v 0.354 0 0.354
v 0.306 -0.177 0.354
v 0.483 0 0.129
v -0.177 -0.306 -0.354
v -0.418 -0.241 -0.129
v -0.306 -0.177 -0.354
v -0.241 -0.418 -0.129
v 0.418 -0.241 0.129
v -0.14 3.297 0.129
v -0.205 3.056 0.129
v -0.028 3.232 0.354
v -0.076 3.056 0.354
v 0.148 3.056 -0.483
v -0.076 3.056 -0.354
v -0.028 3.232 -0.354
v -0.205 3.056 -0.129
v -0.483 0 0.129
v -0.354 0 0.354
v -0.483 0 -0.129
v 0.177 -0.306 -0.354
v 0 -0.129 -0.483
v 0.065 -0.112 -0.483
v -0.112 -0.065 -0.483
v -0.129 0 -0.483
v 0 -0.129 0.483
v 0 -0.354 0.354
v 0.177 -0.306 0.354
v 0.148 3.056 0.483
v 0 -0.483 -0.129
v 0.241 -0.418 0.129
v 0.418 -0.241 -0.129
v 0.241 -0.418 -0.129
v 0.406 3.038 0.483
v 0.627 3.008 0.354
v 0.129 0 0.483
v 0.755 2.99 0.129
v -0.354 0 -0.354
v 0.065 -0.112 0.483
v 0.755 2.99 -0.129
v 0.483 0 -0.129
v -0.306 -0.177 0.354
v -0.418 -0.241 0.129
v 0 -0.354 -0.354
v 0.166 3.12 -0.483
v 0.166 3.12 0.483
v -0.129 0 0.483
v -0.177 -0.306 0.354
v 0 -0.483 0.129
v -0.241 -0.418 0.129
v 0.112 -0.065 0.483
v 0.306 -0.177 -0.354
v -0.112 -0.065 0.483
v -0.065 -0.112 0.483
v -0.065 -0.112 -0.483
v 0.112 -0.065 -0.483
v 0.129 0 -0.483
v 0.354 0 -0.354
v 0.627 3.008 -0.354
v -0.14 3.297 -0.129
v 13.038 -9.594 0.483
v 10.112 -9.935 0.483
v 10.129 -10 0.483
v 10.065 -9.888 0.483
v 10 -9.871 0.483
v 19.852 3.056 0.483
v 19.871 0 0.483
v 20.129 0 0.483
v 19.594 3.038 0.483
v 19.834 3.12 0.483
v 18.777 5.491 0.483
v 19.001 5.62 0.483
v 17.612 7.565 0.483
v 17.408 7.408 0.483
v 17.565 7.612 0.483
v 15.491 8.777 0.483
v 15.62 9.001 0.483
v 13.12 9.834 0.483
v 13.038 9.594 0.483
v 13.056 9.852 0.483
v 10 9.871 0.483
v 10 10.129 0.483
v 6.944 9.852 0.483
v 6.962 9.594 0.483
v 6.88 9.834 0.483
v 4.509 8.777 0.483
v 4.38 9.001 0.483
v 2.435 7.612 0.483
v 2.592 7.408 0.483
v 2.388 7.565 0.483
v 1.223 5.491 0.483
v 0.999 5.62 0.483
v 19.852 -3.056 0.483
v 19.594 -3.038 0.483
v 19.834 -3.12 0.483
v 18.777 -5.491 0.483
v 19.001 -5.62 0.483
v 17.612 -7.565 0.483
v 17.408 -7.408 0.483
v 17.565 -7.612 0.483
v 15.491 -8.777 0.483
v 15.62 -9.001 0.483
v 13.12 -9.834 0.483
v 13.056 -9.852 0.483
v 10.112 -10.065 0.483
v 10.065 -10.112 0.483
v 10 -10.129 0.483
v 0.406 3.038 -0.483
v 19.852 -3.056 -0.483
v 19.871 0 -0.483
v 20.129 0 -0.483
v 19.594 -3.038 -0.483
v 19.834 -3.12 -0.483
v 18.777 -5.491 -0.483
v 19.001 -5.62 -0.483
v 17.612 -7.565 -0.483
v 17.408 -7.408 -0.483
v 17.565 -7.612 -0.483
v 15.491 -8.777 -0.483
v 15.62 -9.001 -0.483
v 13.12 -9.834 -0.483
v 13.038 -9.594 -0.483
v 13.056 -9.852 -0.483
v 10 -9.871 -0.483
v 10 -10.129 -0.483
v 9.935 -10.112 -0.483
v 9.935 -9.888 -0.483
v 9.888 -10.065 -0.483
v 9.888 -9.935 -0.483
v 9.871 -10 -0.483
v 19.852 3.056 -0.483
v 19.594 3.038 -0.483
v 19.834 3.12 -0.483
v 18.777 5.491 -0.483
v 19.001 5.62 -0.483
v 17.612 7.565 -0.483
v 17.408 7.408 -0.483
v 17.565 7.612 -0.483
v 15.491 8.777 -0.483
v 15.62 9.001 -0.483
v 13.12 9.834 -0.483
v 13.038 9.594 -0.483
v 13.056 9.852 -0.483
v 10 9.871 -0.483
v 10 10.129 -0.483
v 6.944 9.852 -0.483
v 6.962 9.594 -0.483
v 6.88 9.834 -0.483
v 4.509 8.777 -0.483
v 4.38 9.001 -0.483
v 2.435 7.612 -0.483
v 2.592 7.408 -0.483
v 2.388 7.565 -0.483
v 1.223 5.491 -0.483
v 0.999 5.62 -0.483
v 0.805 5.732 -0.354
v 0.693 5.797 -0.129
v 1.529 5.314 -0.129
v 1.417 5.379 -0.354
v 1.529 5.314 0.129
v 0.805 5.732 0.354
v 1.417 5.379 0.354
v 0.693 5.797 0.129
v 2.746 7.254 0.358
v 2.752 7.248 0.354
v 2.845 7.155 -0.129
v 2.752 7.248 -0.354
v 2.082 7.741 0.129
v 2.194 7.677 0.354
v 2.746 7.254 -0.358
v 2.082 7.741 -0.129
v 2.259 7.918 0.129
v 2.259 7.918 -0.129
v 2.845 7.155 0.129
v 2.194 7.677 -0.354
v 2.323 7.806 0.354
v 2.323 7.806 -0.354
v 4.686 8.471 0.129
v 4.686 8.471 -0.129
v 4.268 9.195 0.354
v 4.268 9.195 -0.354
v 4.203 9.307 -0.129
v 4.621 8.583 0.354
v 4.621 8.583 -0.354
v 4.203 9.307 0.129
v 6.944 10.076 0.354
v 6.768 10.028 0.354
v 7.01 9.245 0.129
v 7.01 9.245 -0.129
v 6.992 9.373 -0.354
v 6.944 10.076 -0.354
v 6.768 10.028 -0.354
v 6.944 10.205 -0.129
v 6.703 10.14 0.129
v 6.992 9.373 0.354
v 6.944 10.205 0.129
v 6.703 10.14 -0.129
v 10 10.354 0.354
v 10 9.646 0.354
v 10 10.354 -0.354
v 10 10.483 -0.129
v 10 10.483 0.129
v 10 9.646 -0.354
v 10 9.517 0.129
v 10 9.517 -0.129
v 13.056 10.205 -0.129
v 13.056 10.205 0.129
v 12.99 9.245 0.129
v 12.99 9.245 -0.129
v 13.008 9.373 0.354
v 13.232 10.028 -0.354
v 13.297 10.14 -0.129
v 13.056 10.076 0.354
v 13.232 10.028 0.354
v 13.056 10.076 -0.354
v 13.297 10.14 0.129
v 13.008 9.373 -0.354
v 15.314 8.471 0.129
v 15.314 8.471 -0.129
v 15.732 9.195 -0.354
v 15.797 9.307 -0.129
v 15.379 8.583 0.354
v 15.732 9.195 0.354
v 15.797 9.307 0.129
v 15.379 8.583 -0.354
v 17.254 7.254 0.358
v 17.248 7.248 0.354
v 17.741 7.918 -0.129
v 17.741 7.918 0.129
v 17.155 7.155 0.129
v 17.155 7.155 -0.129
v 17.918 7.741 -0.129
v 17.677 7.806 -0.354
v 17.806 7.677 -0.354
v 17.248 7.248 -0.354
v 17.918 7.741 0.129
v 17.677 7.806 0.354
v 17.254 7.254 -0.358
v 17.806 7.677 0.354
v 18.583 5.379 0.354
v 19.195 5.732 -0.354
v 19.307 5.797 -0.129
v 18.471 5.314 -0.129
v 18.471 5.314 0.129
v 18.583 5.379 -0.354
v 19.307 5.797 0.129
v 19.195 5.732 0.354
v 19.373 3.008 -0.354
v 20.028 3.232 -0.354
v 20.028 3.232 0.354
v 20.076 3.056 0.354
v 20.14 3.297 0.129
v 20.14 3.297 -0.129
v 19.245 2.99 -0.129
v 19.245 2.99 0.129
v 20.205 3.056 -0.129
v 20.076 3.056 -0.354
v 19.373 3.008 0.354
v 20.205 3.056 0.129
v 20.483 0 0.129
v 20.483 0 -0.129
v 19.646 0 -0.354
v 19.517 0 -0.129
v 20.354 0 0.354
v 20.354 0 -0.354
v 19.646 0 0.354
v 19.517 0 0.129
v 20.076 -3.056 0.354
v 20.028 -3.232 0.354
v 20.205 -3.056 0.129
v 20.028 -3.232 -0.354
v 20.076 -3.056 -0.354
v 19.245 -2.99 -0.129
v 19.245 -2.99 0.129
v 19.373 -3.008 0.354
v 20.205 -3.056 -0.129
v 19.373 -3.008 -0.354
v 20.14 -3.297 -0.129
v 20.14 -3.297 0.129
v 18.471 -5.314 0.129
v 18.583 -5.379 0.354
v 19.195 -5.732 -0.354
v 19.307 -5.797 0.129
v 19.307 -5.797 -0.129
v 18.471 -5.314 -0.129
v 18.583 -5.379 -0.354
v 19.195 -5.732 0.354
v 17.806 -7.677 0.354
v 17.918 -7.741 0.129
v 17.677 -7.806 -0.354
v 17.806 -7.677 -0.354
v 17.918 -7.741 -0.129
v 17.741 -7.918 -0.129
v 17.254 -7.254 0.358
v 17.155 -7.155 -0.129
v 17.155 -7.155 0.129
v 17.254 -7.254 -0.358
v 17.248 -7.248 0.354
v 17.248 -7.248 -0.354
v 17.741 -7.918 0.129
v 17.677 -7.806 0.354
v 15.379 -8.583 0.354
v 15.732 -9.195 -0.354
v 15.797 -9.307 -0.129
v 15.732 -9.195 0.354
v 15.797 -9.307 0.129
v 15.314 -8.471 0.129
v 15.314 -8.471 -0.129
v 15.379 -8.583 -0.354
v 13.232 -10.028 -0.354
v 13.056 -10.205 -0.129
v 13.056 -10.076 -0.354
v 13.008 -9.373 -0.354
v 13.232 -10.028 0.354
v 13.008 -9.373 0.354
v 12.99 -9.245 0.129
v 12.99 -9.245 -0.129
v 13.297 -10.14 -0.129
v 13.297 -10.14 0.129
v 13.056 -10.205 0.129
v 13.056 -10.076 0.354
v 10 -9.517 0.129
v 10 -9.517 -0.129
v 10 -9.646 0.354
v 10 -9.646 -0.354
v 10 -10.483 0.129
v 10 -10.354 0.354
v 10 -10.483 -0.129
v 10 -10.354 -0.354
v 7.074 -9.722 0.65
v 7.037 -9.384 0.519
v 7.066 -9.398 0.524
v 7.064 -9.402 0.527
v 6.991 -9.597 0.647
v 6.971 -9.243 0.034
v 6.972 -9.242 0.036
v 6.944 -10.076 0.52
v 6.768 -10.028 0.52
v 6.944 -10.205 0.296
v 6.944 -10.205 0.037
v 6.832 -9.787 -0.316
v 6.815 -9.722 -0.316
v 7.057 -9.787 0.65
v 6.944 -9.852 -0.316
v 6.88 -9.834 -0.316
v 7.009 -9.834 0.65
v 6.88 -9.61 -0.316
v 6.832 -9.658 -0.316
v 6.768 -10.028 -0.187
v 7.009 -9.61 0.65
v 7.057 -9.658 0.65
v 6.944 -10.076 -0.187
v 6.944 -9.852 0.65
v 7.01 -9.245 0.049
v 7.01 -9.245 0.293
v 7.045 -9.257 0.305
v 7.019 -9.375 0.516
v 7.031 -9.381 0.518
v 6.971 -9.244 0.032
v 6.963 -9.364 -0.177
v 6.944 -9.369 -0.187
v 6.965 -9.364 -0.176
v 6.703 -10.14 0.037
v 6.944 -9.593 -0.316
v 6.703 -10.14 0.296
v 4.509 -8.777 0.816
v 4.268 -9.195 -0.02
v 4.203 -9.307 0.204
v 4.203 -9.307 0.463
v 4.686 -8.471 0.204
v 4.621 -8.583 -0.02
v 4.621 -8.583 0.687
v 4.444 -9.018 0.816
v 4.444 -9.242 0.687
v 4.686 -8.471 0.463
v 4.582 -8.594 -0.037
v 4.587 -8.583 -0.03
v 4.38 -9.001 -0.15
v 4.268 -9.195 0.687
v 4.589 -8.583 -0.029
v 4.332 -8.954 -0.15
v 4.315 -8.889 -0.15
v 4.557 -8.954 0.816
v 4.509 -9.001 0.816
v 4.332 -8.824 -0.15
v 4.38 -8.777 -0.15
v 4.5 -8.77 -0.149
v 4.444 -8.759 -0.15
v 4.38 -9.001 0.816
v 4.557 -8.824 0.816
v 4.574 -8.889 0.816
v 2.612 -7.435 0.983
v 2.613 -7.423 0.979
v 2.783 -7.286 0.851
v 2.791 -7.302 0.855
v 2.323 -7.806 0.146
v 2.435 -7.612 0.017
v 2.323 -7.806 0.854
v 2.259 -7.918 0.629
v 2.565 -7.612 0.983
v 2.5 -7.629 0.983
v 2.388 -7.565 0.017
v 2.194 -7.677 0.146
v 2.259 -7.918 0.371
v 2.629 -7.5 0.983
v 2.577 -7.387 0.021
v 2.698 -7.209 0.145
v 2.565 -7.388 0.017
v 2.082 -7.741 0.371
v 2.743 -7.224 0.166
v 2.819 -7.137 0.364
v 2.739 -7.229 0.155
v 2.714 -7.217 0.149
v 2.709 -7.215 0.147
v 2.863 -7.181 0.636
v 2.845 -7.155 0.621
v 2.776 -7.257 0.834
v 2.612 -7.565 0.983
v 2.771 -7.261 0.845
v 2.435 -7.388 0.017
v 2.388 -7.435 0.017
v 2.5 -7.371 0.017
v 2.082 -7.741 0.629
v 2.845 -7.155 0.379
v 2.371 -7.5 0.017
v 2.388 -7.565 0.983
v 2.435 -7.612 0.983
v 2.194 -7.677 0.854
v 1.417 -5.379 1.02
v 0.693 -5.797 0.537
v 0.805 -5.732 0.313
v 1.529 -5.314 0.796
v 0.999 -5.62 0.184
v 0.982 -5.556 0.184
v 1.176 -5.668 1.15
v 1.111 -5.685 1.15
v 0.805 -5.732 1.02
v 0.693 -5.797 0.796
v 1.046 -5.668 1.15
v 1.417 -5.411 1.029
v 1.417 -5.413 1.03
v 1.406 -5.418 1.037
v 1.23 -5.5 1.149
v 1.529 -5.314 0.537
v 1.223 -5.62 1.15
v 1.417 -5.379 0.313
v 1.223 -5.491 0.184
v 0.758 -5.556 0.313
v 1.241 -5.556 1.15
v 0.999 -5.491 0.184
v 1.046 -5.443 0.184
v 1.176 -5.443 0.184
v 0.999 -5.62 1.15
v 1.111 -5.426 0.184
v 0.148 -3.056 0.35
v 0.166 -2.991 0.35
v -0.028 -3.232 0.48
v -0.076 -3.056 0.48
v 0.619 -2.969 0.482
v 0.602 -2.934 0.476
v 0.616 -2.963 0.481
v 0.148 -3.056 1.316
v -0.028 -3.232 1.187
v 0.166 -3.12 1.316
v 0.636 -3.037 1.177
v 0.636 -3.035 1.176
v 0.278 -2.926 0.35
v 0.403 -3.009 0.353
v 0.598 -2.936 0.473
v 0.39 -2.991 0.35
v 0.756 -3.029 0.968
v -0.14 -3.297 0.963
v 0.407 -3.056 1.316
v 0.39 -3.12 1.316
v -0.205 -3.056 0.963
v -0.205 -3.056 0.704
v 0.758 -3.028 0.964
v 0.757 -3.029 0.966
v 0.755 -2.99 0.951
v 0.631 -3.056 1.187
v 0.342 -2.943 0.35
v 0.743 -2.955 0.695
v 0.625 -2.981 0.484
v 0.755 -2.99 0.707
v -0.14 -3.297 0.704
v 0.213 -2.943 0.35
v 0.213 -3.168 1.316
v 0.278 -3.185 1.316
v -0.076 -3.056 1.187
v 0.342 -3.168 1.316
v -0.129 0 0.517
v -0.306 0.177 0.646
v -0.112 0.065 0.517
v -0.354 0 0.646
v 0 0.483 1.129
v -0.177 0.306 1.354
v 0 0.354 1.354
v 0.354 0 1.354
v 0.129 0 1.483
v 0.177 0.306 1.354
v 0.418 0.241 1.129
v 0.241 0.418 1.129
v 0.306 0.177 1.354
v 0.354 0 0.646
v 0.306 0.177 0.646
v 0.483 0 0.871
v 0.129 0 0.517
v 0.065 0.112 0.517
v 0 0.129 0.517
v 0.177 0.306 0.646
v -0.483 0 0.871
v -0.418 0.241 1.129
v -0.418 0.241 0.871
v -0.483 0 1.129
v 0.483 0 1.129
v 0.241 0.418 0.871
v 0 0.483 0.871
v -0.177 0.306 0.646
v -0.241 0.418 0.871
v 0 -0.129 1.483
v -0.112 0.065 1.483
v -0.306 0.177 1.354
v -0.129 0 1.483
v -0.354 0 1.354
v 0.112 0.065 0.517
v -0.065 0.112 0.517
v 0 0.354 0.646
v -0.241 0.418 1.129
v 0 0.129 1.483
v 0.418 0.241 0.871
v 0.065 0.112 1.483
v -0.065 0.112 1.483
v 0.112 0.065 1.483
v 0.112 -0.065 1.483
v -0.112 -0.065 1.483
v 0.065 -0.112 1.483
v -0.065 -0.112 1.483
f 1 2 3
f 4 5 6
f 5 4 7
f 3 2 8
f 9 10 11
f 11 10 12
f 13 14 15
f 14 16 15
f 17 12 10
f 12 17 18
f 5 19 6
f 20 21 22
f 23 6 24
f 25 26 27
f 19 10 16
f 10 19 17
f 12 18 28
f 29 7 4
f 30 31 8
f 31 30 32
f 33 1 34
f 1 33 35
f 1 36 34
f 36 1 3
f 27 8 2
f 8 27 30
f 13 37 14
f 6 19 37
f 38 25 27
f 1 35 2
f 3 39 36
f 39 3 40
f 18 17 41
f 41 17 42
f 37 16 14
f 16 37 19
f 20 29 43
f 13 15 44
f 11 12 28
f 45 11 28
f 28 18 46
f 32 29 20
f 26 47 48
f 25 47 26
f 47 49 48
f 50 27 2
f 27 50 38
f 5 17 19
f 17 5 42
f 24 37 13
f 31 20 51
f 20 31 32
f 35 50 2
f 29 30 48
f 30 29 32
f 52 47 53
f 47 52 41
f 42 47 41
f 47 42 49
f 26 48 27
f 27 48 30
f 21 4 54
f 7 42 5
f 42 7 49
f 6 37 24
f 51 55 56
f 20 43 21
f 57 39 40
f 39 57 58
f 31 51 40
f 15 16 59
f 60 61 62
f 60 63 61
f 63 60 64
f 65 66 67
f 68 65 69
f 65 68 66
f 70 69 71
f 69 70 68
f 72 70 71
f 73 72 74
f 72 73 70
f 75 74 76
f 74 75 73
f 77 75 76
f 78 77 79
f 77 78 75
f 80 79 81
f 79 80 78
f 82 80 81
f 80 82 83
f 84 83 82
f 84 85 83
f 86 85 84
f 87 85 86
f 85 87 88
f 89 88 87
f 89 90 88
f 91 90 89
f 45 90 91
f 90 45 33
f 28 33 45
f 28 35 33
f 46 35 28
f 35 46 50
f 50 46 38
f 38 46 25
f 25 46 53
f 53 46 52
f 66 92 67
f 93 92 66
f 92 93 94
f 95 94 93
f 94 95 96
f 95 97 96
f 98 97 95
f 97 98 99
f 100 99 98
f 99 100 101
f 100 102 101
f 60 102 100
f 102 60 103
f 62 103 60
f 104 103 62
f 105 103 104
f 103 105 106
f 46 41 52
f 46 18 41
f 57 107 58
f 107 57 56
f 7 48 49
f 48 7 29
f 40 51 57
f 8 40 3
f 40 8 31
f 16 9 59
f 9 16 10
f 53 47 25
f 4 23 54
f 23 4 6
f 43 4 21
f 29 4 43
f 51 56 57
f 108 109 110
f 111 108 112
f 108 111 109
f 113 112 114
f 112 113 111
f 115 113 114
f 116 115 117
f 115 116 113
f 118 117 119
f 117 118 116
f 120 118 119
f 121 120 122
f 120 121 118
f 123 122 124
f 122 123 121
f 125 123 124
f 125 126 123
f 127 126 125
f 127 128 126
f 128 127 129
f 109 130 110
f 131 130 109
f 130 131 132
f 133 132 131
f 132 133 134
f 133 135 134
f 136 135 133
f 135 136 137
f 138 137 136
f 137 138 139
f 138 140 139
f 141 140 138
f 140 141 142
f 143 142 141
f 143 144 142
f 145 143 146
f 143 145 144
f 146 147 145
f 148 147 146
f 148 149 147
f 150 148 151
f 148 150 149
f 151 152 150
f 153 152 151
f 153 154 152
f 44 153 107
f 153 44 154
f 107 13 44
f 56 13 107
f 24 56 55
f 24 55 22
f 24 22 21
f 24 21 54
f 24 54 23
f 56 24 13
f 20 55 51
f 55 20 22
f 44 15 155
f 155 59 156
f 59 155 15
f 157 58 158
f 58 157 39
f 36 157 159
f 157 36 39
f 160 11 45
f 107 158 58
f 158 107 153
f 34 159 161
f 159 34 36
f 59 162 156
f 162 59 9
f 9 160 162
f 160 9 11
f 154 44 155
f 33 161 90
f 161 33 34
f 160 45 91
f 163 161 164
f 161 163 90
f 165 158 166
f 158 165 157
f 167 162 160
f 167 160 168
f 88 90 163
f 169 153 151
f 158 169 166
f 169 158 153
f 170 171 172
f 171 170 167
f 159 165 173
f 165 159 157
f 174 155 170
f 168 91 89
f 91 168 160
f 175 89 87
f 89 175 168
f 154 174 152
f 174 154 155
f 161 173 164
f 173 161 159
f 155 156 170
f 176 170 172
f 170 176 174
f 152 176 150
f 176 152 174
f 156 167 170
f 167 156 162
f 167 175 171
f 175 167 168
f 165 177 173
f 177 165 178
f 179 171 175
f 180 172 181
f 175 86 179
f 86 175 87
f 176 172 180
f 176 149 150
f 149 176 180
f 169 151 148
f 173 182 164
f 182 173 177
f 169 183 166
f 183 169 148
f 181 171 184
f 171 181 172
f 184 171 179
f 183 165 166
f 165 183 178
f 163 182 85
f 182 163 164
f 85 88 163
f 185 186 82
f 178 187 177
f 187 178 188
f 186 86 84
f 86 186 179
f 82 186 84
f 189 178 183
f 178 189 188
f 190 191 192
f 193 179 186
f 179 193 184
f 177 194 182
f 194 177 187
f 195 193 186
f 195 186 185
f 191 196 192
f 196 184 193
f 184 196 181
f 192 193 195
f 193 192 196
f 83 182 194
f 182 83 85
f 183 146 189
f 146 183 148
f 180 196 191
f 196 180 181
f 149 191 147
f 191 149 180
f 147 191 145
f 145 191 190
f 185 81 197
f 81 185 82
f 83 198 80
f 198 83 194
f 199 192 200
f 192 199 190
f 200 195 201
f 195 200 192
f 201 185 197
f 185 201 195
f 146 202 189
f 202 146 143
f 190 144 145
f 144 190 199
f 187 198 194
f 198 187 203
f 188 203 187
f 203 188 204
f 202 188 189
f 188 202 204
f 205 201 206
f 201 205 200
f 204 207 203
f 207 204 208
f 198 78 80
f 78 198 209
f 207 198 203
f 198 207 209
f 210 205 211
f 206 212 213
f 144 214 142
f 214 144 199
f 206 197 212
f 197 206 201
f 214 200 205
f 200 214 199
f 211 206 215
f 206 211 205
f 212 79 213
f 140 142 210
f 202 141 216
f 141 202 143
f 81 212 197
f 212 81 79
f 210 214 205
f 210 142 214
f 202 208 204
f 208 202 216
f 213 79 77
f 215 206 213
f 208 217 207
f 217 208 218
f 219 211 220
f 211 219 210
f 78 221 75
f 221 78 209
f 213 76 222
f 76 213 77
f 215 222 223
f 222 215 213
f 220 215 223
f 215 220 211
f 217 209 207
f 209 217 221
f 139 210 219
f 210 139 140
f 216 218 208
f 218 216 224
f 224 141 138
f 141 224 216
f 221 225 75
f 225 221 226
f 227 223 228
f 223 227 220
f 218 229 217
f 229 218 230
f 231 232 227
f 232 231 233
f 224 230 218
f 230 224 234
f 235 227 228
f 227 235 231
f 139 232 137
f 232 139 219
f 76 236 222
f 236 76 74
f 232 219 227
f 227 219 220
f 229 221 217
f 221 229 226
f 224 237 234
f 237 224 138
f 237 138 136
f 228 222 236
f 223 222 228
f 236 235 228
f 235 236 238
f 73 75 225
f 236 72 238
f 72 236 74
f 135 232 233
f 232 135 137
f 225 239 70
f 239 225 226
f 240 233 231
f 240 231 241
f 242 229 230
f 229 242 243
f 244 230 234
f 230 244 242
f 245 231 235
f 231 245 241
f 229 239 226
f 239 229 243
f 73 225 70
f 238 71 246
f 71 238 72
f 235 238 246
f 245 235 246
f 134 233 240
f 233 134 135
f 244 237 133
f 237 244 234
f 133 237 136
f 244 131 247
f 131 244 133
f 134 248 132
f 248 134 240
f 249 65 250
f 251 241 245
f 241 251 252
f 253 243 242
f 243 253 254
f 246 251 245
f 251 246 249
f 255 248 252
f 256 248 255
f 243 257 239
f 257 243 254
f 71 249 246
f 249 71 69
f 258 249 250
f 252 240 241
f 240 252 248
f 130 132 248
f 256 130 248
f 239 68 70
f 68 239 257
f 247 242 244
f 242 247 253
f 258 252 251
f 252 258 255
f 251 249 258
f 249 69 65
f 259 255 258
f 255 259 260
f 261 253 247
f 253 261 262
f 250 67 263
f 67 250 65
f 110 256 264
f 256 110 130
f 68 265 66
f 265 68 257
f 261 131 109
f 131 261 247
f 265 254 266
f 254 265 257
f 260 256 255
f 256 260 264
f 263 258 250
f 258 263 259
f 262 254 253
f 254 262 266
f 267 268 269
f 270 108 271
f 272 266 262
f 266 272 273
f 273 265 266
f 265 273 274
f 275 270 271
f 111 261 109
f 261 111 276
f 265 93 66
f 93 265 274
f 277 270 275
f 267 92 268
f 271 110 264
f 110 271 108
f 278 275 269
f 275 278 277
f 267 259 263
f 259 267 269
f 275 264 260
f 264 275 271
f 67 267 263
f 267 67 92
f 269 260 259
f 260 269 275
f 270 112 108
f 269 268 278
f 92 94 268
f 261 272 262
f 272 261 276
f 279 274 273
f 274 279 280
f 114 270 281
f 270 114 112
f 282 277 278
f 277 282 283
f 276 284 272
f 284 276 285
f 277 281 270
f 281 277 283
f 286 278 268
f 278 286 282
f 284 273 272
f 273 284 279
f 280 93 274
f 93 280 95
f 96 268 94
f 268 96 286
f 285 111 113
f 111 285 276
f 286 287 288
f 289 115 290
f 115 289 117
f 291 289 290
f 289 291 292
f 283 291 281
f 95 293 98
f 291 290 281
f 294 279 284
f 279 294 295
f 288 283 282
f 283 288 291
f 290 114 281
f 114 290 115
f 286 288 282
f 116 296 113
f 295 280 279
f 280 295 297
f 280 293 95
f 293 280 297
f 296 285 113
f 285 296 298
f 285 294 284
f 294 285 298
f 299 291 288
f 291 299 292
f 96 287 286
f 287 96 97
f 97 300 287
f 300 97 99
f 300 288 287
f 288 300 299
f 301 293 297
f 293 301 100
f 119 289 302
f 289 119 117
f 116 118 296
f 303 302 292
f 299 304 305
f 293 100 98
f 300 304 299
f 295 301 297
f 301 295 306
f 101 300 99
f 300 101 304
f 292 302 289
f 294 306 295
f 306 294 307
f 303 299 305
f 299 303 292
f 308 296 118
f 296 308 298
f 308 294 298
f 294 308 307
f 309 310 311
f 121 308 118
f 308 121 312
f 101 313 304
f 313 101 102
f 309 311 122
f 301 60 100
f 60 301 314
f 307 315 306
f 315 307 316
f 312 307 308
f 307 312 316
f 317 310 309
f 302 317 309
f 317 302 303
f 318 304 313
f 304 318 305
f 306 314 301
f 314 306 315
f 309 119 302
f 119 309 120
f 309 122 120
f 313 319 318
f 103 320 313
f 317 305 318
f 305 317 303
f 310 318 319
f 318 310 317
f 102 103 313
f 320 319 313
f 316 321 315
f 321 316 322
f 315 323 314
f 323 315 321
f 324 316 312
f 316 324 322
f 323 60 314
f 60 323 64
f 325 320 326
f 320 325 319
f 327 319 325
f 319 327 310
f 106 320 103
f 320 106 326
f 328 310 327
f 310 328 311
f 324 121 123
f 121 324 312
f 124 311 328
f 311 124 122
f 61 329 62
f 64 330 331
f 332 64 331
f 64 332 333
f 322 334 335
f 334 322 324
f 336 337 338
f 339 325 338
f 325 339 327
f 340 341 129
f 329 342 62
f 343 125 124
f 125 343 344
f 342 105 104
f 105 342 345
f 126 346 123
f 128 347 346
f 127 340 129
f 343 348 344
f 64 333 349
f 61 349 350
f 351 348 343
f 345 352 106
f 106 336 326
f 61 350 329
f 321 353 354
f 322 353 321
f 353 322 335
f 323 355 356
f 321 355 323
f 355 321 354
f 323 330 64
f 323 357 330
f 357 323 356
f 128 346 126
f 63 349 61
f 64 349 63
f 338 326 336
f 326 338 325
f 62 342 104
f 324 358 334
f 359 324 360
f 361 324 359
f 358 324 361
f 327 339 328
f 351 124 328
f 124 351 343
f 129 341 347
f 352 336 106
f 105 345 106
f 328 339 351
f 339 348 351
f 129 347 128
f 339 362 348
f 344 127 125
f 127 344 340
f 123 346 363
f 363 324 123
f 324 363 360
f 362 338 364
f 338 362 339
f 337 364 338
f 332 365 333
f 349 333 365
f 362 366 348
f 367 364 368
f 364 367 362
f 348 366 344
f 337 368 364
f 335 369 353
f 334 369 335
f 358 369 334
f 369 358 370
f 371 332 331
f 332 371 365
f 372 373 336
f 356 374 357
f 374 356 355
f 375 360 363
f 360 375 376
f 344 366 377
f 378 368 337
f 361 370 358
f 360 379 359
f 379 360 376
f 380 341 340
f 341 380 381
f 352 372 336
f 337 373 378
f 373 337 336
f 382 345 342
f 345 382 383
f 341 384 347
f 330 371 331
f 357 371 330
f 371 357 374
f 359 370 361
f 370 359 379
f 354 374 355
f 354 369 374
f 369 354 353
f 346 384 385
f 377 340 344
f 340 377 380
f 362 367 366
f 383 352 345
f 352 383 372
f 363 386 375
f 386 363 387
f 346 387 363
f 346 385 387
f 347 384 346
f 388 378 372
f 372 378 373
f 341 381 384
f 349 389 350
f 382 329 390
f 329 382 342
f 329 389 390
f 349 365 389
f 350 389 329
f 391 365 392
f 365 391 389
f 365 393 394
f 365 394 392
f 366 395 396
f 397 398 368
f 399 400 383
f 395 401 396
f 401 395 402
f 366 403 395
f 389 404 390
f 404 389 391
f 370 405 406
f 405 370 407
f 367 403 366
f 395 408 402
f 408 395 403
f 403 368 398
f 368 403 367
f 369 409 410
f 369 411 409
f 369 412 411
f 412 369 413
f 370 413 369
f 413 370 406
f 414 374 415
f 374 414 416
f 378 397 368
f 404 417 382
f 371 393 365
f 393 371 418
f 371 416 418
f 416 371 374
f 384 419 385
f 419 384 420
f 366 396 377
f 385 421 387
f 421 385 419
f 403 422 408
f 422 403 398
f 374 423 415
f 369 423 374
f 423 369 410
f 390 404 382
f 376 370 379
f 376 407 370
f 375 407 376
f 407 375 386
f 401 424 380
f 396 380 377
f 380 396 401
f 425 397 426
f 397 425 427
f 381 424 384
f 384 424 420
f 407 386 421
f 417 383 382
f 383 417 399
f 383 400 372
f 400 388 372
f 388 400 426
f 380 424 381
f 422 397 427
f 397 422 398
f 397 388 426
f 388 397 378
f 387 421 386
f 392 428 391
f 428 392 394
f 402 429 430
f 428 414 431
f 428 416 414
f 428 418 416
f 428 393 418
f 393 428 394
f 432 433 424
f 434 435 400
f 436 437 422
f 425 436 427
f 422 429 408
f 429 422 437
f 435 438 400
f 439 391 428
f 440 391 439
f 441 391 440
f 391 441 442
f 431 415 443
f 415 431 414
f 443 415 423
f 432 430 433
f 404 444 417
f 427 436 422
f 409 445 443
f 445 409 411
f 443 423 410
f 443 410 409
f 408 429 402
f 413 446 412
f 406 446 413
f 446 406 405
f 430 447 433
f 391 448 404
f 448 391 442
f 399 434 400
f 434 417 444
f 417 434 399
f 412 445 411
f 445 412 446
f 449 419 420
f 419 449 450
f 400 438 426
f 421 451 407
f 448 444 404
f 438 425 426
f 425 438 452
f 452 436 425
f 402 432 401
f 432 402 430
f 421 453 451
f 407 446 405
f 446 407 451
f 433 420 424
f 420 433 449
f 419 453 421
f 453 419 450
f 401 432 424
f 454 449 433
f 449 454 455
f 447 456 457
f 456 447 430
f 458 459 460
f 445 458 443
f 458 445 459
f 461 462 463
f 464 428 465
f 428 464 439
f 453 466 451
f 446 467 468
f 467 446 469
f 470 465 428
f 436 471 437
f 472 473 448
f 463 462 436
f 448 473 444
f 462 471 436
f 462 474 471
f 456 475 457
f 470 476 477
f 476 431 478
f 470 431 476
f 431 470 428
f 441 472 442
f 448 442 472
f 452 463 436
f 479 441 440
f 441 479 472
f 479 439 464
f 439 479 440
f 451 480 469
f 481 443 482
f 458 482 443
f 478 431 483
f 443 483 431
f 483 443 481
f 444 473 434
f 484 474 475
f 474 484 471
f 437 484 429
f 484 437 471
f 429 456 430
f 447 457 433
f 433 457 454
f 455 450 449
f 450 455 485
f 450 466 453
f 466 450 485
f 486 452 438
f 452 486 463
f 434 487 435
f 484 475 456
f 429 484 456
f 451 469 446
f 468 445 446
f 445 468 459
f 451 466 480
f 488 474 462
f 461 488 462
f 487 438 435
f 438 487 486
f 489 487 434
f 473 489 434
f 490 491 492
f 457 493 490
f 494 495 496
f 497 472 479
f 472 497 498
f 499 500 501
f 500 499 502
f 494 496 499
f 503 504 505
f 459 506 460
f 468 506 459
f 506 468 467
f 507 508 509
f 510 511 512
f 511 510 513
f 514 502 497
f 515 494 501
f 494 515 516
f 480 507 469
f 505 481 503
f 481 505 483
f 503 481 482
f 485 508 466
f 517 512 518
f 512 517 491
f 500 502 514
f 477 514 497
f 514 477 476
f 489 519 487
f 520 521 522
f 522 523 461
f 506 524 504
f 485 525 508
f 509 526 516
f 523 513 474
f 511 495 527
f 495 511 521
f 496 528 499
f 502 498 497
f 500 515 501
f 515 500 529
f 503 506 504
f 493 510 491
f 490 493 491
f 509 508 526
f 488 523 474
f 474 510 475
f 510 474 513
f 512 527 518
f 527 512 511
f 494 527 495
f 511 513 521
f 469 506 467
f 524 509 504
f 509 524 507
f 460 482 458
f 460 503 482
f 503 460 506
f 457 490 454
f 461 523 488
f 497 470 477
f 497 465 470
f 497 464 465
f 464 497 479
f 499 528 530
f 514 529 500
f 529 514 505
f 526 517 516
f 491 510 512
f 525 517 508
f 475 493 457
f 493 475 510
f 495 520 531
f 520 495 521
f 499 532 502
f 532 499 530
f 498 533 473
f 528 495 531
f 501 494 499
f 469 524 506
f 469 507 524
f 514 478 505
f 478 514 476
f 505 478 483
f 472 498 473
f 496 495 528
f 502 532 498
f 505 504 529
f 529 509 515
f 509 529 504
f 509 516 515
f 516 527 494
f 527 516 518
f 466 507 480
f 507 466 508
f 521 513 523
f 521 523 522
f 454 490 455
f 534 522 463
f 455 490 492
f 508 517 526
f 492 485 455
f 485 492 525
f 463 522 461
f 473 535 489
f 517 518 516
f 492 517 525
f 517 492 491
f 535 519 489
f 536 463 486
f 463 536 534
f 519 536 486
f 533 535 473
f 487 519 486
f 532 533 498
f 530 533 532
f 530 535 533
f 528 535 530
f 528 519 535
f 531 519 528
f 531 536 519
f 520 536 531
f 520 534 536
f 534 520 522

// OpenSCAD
// file: ../src/cadence.scad
// as of 2019.05, OpenSCAD understands
// is_num, is_list, is_string, and, is_bool
//
// is_function is coming, but looks tricky



function _normalize_angle(a) =
  ((a >= 0 && a <= 360) ? a : _normalize_angle(a + (a < 0 ? 360 : -360)));


//
// dictionary functions

function _aaget(dict, key, default, off) =
  let (kv = dict[off])
    kv == undef ? default :
    kv[0] == key ? kv[1] :
      _aaget(dict, key, default, off + 1);

function _asget(dict, key, default, off) =
  dict[off] == undef ? default :
  dict[off] == key ? dict[off + 1] :
    _asget(dict, key, default, off + 2);

function _get(dict, key, default=undef) =
  is_string(dict[0]) ?
    _asget(dict, key, default, 0) :
    _aaget(dict, key, default, 0);

function _del(dict, key) =
  [ for (kv = dict) if (kv[0] != key) kv ];

function _put(dict, key, value) =
  concat(_del(dict, key), [ [ key, value ] ]);


//
// list functions

function _idx(list, index, default=undef) =
  let (
    i = index < 0 ? len(list) + index : index,
    r = list[i]
  )
    r == undef ? default : r;

  // sublist
  //
function _slist(list, from=0, to) =
  let(
    li = len(list) - 1,
    end = (to == undef ? li : to),
    a0 = from < 0 ? li + 1 + from : from,
    a = a0 < 0 ? 0 : a0,
    z = end < 0 ? li + 1 + end : end
  )
    a > li ? [] :
    z < a ? [] :
      [ for (i = [a:z]) list[i] ];

function _reverse(list) =
  [ for (i = [ len(list) - 1 : -1 : 0 ]) list[i] ];

//
// point functions

  // Accept a single angle instead of [ angle0, angle1 ]
  // 'sp' is the start point
  //
function _to_point(length, angles, sp=[ 0, 0, 0 ]) =
  let(
    as = is_num(angles) ? [ angles, 0 ] : angles,
    inclination = as[0],
    azimuth = as[1] + 90
  )
    sp + [
      length * cos(inclination) * cos(azimuth),
      length * cos(inclination) * sin(azimuth),
      length * sin(inclination) ];

function _to_spherical(point) =
  let(
    l = norm(point),
    ele = asin(point.z / l),
    dir = atan2(point.y, point.x)
  )
    [ l, [ ele, dir - 90 ] ];


function _midpoint(p0, p1, ratio=0.5) =
  let(
    s = _to_spherical(p1 - p0)
  )
    _to_point(ratio * s[0], s[1], p0);

//function _vlen(vector) =
//  sqrt(pow(vector.x, 2) + pow(vector.y, 2) + pow(vector.z, 2));
  //
  // no, use norm(vector)


// inspiration:
// https://climberg.de/post/openscad_bezier_curves_of_any_degrees

function _bezier_choose(n, k) =
  k == 0 ?  1 : (n * _bezier_choose(n - 1, k - 1)) / k;

function _bezier_point(points, t, i, c) =
  len(points) == i ?
    c :
    _bezier_point(
      points,
      t,
      i + 1,
      c +
        _bezier_choose(len(points) - 1, i) *
        pow(t, i) *
        pow(1 - t, len(points) - i - 1) * points[i]);

function _bezier_points(control_points, sample_count) =
  [ for (t = [ 0 : 1.0 / sample_count : 1 ])
    _bezier_point(control_points, t, 0, [ 0, 0, 0 ]) ];


//
// modules

module polypoints(points) {

  for (i = [ 0 : len(points) - 1 ]) {
    translate(points[i]) children(i % $children);
  }
}

module polyhulls(points) {

  for (i = [ 0 : len(points) - 2 ]) {

    hull() {
      translate(points[i]) children(i % $children);
      translate(points[i + 1]) children((i + 1) % $children);
    }
  }
}


// pineapple slice
//
module paslice(radius, depth, slice=45, radius1=0) {

  s = _normalize_angle(slice);
  r = radius;

  if (s > 0) difference() {

    cylinder(depth, r=r);

    translate([ 0, 0, -0.1 ]) cylinder(depth * 1.1, r=radius1);

    if (s != 360) {

      pas = [
        [ 0, r ], [ 0, 0 ] ];
      pbs = [
        [ r, r ], [ r, 0 ], [ r, -r ], [ 0, -r ], [ -r, -r ], [ -r, 0 ],
        [ -r, r ] ];

      t = tan(s);
      tx = t * r;
      ty = r / t;

      translate([ 0, 0, -0.1 ]) linear_extrude(depth + 0.2)
        if (s <= 45)
          polygon(concat(pas, [ [ tx, r ] ], pbs));
        else if (s <= 135)
          polygon(concat(pas, [ [ r, ty ] ], _slist(pbs, 2)));
        else if (s <= 225)
          polygon(concat(pas, [ [ -tx, -r ] ], _slist(pbs, 4)));
        else if (s <= 315)
          polygon(concat(pas, [ [ -r, -ty ] ], _slist(pbs, 6)));
        else if (s < 360)
          polygon(concat(pas, [ [ tx, r ] ]));
    }
  }
}


// dome with optional trunk_height
//
module dome(radius=-1, diameter=-1, trunk_height=0) {

  r = radius < 0 ? diameter / 2 : radius;
  th = trunk_height;

  translate([ 0, 0, th ])
    difference() {
      sphere(r=r);
      translate([ 0, 0, -r ]) cube(2 * r, center=true);
    }
  translate([ 0, 0, th / 2 ])
    cylinder(r=r, h=th, center=true);
}
// main file
//
// bezier2_test.scad
//
// Sun Apr 25 11:54:21 JST 2021
//

use <../src/cadence.scad>;


$fn = 12;


path = [
  [ [ 0, 0, 0 ], [ 0, 10, 0 ], [ 10, 10, 0 ] ],
  [ [ 10, 10, 0 ], [ 20, 10, 0 ], [ 20, 0, 0 ] ],
  [ [ 20, 0, 0 ], [ 20, -10, 0 ], [ 10, -10, 0 ] ],
  [ [ 10, -10, 0 ], [ 0, -10, 0.5 ], [ 0, 0, 1 ] ]
];

for (ps = path) {
  ps1 = _bezier_points(ps, 6);
  polyhulls(ps1) {
    color("blue") sphere(d=1.0);
  }
}
